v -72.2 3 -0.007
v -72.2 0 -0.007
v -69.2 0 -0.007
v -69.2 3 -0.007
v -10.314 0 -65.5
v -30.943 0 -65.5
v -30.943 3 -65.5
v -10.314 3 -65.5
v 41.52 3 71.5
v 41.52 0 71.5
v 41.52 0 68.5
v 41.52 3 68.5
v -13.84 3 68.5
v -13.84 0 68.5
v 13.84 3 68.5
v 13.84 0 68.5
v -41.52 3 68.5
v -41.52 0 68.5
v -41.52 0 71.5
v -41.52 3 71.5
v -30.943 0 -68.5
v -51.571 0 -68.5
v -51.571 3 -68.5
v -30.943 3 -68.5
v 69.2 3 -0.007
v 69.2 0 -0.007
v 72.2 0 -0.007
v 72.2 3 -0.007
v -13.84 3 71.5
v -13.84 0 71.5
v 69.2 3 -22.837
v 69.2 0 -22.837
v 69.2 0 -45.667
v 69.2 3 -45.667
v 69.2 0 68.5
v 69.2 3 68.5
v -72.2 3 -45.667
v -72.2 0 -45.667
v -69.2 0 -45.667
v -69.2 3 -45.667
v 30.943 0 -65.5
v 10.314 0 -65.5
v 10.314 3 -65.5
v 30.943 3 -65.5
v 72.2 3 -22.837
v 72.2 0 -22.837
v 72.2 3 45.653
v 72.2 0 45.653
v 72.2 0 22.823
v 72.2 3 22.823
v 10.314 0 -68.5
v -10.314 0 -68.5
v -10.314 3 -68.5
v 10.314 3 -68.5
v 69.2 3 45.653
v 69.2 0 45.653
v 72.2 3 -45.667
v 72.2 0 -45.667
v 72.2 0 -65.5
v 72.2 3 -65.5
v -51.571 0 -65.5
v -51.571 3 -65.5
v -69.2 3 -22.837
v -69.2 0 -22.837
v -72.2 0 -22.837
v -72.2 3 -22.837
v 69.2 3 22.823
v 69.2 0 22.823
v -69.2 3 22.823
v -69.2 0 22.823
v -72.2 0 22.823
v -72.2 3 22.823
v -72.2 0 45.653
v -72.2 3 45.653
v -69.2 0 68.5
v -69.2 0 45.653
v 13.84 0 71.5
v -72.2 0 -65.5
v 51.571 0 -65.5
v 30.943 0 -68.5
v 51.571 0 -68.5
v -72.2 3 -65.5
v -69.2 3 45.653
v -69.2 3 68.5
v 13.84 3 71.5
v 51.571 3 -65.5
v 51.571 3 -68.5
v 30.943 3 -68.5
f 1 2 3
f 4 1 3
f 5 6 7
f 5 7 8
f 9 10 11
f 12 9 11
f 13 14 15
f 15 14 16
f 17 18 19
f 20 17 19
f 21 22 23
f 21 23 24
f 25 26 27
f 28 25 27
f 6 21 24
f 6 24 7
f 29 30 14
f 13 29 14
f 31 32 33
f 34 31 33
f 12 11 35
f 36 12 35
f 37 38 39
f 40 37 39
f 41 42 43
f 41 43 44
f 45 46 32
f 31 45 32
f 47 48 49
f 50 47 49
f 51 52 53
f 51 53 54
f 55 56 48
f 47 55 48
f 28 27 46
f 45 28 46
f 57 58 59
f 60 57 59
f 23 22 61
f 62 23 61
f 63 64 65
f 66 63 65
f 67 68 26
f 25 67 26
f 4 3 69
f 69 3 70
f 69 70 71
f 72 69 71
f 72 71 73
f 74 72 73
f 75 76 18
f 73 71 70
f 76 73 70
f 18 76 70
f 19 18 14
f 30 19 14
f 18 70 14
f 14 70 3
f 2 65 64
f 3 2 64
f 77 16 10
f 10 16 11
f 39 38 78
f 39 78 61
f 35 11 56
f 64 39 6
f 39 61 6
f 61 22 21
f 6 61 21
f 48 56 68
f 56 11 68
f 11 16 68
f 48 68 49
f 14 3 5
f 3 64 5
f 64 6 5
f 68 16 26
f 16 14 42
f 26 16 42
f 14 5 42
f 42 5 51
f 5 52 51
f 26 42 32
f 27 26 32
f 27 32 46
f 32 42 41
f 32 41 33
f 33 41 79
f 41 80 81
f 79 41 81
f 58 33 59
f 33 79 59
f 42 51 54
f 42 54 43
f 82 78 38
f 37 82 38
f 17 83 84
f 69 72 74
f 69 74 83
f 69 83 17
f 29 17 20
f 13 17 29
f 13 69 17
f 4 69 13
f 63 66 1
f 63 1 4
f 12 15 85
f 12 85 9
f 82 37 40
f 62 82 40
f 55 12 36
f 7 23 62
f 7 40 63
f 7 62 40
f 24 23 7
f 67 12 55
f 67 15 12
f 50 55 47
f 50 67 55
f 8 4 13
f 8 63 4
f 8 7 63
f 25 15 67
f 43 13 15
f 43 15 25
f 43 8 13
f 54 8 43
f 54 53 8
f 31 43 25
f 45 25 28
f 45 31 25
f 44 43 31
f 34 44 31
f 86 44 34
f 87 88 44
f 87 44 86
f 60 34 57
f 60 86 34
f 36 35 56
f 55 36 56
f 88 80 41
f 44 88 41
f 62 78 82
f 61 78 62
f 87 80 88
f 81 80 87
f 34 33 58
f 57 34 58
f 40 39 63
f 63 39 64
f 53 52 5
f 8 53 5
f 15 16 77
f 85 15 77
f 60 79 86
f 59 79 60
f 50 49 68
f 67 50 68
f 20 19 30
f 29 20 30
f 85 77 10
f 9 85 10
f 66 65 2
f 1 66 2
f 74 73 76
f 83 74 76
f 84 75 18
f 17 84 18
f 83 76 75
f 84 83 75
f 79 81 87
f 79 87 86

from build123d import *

# Parameters (mm, degrees)
BOSS_EXTRUDE1_DEPTH = 3
SKETCH4_W           = 144.4
SKETCH4_H           = 3
CUT_EXTRUDE1_DEPTH  = 4
SKETCH5_W           = 20.628571
SKETCH5_H           = 3
BOSS_EXTRUDE2_DEPTH = 3


with BuildPart() as part:
    # Sketch2 → Boss-Extrude1 (new body)
    with BuildSketch(Plane(origin=(0, 0, 0), x_dir=(1, 0, 0), z_dir=(0, 1, 0))):
        Polygon((-69.2, -68.5), (-41.52, -68.5), (-41.52, -71.5), (-13.84, -71.5), (-13.84, -68.5), (13.84, -68.5), (13.84, -71.5), (41.52, -71.5), (41.52, -68.5), (69.2, -68.5), (69.2, -45.653333333), (72.2, -45.653333333), (72.2, -22.823333333), (69.2, -22.823333333), (69.2, 0.006666667), (72.2, 0.006666667), (72.2, 22.836666667), (69.2, 22.836666667), (69.2, 45.666666667), (72.2, 45.666666667), (72.2, 68.5), (-72.2, 68.5), (-72.2, 45.666666667), (-69.2, 45.666666667), (-69.2, 22.836666667), (-72.2, 22.836666667), (-72.2, 0.006666667), (-69.2, 0.006666667), (-69.2, -22.823333333), (-72.2, -22.823333333), (-72.2, -45.653333333), (-69.2, -45.653333333), align=None)
    extrude(amount=BOSS_EXTRUDE1_DEPTH)

    # Sketch4 → Cut-Extrude1 (cut, through all)
    with BuildSketch(Plane.XZ):
        with Locations((0, -67)):
            Rectangle(SKETCH4_W, SKETCH4_H)
    extrude(amount=-CUT_EXTRUDE1_DEPTH, mode=Mode.SUBTRACT)

    # Sketch5 → Boss-Extrude2 (add)
    with BuildSketch(Plane.XZ):
        with Locations((-41.257143071, -67)):
            Rectangle(SKETCH5_W, SKETCH5_H)
        with Locations((-1.071e-06, -67)):
            Rectangle(SKETCH5_W, SKETCH5_H)
        with Locations((41.257140929, -67)):
            Rectangle(SKETCH5_W, SKETCH5_H)
    extrude(amount=-BOSS_EXTRUDE2_DEPTH)


solid = part.part
